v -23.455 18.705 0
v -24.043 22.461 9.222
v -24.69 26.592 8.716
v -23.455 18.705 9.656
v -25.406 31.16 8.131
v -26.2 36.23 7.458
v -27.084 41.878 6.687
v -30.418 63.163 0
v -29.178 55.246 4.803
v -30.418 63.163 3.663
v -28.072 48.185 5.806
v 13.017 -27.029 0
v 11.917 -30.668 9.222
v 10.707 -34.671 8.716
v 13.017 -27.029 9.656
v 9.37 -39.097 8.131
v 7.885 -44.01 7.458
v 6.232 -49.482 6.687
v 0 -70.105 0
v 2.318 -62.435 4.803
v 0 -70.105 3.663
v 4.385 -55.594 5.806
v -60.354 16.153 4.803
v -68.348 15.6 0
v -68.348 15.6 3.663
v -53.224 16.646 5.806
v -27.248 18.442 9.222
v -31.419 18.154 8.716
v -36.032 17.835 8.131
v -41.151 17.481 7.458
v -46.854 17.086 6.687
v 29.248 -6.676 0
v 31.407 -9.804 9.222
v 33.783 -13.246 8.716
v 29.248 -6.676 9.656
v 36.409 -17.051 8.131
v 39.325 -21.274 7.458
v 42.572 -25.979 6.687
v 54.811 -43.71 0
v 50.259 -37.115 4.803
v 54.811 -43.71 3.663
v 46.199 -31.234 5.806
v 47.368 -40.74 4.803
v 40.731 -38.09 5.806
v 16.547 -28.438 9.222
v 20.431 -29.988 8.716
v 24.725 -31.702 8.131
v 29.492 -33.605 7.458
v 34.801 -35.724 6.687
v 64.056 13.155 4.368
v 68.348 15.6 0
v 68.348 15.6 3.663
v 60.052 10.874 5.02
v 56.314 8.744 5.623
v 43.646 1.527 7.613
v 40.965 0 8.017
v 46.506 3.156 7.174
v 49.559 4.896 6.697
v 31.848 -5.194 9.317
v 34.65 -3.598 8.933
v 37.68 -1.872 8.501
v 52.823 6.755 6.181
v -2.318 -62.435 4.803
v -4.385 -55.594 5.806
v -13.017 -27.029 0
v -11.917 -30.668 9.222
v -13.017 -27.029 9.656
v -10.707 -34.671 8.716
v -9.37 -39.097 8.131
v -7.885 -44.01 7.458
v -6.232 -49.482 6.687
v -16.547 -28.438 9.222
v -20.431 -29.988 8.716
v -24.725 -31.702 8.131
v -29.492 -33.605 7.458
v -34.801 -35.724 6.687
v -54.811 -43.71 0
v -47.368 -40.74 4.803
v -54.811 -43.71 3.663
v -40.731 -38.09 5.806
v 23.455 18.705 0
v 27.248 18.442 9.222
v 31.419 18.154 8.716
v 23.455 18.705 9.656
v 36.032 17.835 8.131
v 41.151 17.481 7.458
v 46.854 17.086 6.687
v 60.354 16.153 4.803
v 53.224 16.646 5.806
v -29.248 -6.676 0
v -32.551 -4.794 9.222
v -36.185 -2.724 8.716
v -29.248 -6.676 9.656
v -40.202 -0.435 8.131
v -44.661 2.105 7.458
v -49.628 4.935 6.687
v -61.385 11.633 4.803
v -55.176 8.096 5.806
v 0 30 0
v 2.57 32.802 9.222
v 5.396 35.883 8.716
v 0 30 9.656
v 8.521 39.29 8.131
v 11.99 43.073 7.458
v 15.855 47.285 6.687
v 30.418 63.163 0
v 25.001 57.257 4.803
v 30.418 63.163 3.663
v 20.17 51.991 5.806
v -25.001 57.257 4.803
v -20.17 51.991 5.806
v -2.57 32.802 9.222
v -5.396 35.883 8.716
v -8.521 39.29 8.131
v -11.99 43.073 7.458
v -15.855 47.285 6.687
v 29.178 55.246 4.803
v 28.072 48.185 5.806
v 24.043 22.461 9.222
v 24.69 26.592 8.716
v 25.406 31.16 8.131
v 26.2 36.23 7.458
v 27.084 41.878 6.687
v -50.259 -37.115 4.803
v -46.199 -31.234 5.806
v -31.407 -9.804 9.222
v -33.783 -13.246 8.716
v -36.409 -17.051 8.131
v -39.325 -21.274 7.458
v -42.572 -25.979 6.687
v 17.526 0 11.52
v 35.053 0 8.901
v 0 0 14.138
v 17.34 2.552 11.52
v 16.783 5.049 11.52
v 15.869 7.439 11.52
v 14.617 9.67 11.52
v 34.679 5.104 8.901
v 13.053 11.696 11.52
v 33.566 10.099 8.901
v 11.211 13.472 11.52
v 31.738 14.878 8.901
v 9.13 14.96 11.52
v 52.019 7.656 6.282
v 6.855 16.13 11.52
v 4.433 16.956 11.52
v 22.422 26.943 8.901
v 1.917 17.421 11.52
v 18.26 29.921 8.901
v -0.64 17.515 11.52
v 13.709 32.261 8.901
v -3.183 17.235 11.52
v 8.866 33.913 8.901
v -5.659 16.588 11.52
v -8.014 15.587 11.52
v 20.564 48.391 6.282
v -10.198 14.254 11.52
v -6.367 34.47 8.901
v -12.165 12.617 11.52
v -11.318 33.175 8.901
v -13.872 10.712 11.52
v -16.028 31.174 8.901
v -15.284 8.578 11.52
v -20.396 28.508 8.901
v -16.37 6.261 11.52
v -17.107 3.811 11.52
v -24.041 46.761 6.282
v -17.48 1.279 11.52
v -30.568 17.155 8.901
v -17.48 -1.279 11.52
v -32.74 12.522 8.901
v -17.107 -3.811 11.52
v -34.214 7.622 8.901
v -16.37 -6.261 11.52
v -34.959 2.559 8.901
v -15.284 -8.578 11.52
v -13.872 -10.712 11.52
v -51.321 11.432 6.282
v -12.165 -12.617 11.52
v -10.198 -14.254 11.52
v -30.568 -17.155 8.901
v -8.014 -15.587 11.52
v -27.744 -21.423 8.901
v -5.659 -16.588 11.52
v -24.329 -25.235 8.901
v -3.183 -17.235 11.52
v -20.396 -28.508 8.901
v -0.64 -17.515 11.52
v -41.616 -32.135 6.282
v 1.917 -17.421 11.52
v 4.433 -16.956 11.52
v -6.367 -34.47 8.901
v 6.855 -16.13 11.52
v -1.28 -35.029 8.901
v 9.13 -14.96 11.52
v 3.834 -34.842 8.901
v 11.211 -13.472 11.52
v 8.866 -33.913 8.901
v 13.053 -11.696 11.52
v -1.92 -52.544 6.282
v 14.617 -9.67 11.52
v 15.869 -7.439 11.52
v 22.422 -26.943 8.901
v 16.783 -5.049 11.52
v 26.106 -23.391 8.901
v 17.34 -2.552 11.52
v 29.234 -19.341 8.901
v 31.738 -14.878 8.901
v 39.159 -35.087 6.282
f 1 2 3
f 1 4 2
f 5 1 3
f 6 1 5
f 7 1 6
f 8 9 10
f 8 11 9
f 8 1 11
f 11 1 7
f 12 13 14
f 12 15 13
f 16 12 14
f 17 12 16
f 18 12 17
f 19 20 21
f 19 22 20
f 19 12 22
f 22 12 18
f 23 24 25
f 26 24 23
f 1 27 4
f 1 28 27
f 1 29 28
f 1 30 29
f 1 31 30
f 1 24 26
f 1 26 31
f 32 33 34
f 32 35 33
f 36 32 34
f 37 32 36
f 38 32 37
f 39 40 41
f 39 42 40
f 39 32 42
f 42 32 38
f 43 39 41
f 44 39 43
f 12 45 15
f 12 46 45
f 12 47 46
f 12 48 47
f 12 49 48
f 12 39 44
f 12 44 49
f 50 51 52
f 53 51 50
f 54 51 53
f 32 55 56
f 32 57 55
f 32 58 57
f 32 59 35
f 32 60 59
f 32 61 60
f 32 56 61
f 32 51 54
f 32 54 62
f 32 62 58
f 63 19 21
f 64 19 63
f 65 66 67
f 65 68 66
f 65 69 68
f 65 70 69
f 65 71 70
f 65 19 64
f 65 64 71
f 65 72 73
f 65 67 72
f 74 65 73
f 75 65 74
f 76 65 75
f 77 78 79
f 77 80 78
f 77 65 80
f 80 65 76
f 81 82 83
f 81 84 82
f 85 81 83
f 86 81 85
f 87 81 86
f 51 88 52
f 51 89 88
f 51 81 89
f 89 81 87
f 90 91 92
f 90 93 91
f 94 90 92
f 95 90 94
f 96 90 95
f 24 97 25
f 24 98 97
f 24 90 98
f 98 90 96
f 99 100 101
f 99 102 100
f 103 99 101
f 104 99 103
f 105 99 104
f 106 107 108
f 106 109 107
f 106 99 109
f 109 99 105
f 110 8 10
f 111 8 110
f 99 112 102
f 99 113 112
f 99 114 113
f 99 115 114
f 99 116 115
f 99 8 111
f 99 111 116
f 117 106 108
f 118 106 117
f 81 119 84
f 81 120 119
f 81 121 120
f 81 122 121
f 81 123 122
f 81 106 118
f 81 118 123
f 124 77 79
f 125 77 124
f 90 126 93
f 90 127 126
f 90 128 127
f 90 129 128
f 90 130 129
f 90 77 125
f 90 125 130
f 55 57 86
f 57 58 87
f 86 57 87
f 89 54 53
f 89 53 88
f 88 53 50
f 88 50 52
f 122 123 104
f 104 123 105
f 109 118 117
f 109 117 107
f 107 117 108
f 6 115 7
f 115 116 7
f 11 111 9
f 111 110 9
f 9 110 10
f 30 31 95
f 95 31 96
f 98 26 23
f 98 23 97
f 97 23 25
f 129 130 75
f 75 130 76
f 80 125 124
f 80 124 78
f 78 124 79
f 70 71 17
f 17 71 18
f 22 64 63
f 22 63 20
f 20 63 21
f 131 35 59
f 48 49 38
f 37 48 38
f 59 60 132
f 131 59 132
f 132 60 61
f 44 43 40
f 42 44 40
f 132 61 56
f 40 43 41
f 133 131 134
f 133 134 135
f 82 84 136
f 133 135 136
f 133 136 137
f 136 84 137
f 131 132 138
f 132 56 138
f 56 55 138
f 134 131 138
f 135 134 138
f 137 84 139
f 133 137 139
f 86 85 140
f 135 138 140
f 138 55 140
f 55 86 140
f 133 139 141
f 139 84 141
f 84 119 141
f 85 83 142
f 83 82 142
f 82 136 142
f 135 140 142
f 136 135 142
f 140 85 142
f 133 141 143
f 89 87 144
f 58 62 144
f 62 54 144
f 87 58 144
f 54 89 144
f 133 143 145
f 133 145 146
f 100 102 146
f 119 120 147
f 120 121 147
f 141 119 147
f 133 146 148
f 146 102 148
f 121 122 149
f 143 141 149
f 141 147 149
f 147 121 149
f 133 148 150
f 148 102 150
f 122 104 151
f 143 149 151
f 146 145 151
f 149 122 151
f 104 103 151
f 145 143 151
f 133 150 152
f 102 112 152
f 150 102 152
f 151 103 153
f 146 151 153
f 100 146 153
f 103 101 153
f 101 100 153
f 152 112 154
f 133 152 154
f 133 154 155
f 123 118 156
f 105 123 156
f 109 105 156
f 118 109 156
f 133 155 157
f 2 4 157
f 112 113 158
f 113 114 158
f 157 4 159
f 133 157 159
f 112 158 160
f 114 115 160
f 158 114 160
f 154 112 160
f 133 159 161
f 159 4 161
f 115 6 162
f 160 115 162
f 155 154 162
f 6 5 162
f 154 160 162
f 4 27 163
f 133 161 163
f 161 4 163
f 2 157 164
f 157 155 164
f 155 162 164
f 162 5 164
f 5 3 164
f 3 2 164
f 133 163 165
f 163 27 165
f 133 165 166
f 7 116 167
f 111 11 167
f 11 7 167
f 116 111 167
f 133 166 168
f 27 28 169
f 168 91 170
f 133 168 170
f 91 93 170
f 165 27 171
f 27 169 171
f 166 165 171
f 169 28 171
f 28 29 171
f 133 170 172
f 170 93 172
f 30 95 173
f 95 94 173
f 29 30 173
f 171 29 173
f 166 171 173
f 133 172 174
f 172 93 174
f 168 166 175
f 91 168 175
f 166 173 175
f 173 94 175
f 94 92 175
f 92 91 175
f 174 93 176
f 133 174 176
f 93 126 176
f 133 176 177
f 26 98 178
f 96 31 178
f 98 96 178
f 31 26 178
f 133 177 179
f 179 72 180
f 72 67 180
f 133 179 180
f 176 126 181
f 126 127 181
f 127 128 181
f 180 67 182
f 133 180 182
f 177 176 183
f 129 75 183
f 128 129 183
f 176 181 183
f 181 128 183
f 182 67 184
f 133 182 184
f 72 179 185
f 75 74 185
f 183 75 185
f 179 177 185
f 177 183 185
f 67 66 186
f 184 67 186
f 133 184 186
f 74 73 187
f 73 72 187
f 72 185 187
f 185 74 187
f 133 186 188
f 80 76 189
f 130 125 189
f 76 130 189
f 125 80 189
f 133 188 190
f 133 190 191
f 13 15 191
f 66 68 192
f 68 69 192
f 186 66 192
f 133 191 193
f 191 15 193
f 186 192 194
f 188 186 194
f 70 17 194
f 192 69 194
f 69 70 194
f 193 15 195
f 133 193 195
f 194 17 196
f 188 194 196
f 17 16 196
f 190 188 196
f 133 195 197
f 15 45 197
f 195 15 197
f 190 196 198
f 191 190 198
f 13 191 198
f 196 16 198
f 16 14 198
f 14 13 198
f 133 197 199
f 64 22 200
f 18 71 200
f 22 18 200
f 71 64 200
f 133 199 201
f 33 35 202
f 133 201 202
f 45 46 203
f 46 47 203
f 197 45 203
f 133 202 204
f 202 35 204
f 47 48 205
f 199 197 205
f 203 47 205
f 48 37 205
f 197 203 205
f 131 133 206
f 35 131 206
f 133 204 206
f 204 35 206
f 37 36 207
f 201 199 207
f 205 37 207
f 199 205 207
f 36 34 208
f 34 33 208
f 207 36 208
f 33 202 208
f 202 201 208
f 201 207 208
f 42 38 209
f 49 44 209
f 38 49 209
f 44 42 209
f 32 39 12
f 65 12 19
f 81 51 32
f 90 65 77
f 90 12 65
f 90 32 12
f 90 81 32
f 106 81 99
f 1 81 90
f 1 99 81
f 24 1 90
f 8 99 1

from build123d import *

# Parameters (mm, degrees)
PAD_DEPTH = 15


with BuildPart() as part:
    # Sketch → Pad (new body)
    with BuildSketch(Plane.XY):
        Polygon((0, 30), (30.417592, 63.162781), (23.454944, 18.704694), (68.34771, 15.599919), (29.247837, -6.675628), (54.810608, -43.710001), (13.016512, -27.029066), (0, -70.105398), (-13.016512, -27.029066), (-54.810608, -43.710001), (-29.247837, -6.675628), (-68.34771, 15.599919), (-23.454944, 18.704694), (-30.417592, 63.162781), align=None)
    extrude(amount=PAD_DEPTH)

    # Sketch001 → Groove (revolve, cut)
    with BuildSketch(Plane.XZ):
        Polygon((0, 90.473419), (0, 14.138247), (80.88575, 2.052736), (80.88575, 90.473419), align=None)
    revolve(axis=Axis((0, 0, 0), (0, 0, 1)), mode=Mode.SUBTRACT)


solid = part.part
